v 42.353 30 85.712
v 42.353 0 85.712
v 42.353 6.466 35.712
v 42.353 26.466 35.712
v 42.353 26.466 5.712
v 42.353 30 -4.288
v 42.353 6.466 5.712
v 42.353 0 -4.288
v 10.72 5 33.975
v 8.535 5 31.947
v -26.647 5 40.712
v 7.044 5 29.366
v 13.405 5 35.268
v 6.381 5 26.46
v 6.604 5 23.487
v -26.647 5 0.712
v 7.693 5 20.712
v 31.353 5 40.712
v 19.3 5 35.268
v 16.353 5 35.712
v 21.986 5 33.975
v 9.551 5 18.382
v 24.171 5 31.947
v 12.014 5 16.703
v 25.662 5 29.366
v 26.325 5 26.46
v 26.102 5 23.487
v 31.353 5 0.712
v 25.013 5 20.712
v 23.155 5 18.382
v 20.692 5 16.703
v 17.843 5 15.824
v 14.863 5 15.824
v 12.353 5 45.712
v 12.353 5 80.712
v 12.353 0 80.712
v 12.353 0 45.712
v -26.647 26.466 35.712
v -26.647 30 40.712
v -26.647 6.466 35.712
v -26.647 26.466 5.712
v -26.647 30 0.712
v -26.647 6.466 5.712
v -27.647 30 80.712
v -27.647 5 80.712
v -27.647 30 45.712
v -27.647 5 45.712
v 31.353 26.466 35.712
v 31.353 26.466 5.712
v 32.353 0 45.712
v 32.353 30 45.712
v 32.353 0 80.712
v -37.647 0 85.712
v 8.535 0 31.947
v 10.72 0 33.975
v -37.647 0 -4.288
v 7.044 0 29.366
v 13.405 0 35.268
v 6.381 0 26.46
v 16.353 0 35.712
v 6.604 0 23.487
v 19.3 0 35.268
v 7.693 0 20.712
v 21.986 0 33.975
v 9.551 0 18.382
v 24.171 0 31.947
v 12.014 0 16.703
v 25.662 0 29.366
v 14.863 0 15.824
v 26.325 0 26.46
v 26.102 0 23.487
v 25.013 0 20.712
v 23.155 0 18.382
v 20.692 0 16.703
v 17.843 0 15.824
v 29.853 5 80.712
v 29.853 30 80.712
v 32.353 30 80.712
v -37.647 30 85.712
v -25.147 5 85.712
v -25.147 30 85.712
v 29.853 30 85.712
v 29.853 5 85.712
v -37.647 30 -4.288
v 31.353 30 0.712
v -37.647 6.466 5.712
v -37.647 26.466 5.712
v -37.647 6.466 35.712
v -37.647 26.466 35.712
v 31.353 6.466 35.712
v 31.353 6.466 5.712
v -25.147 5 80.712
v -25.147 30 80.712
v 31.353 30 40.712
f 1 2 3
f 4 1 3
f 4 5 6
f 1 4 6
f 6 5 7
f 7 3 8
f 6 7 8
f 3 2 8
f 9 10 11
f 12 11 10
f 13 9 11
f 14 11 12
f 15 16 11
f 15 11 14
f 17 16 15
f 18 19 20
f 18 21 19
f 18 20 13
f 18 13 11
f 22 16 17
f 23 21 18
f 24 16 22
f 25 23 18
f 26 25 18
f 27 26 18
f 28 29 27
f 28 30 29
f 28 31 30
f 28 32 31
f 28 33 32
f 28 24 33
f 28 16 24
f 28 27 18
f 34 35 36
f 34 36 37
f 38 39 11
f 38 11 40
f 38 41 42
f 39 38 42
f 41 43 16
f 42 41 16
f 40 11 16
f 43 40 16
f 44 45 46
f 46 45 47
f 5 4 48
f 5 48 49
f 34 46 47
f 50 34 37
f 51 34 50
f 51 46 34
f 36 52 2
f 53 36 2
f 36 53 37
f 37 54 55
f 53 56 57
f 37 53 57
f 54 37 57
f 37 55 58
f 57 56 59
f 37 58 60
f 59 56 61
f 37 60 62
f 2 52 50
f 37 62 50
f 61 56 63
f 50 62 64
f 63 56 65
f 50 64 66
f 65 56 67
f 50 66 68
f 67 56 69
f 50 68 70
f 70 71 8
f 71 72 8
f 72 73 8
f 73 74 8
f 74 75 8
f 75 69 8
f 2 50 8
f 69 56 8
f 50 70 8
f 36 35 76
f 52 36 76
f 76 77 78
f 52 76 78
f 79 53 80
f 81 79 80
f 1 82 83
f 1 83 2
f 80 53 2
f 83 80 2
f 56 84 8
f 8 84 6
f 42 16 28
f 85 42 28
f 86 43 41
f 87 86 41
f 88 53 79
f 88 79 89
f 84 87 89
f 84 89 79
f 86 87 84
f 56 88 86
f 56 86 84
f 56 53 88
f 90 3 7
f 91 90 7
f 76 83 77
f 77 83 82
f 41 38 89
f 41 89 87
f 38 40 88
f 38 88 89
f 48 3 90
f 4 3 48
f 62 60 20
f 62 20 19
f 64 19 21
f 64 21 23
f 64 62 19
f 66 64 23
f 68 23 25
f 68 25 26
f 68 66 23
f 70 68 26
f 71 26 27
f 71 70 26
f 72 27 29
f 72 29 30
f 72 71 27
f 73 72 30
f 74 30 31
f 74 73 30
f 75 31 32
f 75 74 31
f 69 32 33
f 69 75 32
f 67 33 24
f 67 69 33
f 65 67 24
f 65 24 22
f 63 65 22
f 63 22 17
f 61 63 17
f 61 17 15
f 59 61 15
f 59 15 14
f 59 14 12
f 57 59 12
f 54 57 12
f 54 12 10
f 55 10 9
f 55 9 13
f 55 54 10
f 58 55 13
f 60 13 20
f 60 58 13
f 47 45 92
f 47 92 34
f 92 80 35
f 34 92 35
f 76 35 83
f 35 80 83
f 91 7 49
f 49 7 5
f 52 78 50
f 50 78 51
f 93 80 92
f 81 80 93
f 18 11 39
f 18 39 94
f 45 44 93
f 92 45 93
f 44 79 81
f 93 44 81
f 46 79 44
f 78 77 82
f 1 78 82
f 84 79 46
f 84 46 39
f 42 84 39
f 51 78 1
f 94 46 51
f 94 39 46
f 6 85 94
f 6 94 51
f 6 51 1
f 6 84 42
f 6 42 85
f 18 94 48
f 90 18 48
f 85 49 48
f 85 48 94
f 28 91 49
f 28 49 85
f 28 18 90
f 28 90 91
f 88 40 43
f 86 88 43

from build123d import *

# Parameters (mm, degrees)
SKETCH2_W          = 80
SKETCH2_H          = 100
SKETCH2_R          = 10
CAMERA_LENSE_DEPTH = 5
SKETCH3_W          = 80
SKETCH3_H          = 100
SKETCH3_W_2        = 58
SKETCH3_H_2        = 40
SKETCH3_W_3        = 60
SKETCH3_H_3        = 35
CAMERA_DEPTH       = 25
HOLLOW_START       = -2
SKETCH4_W          = 78
SKETCH4_H          = 27.979664862
HOLLOW_TOP_DEPTH   = 8
SKETCH10_W         = 80
SKETCH10_H         = 10
CUT_EXTRUDE4_DEPTH = 101.201733938
SKETCH11_W         = 30
SKETCH11_H         = 20
CUT_EXTRUDE5_DEPTH = 122.023203799
SKETCH12_W         = 20
SKETCH12_H         = 35
CUT_EXTRUDE6_DEPTH = 99.819975127
SKETCH13_W         = 55
SKETCH13_H         = 25
CUT_EXTRUDE7_DEPTH = 10


with BuildPart() as part:
    # Sketch2 → camera lense (new body)
    with BuildSketch(Plane(origin=(0, 0, 0), x_dir=(1, 0, 0), z_dir=(0, 1, 0))):
        with Locations((2.352941176, -35.712402007)):
            Rectangle(SKETCH2_W, SKETCH2_H)
        with Locations(Location((16.352941176, -25.712402007, 0), (0, 0, 270))):
            Circle(SKETCH2_R, mode=Mode.SUBTRACT)
    extrude(amount=CAMERA_LENSE_DEPTH)

    # Sketch3 → camera (add)
    with BuildSketch(Plane(origin=(0, 5, 0), x_dir=(1, 0, 0), z_dir=(0, 1, 0))):
        with Locations((2.352941176, -35.712402007)):
            Rectangle(SKETCH3_W, SKETCH3_H)
        with Locations((2.352941176, -20.712402007)):
            Rectangle(SKETCH3_W_2, SKETCH3_H_2, mode=Mode.SUBTRACT)
        with Locations((2.352941176, -63.212402007)):
            Rectangle(SKETCH3_W_3, SKETCH3_H_3, mode=Mode.SUBTRACT)
    extrude(amount=CAMERA_DEPTH)

    # Sketch4 → hollow top (cut)
    with BuildSketch(Plane(origin=(0, 0, -14.287597993), x_dir=(-1, 0, 0), z_dir=(0, 0, -1)).offset(HOLLOW_START)):
        with Locations((-2.352941176, 14.989832431)):
            Rectangle(SKETCH4_W, SKETCH4_H)
    extrude(amount=-HOLLOW_TOP_DEPTH, mode=Mode.SUBTRACT)

    # Sketch10 → Cut-Extrude4 (cut, through all)
    with BuildSketch(Plane(origin=(0, 30, 0), x_dir=(1, 0, 0), z_dir=(0, 1, 0))):
        with Locations((2.352941176, 9.287597993)):
            Rectangle(SKETCH10_W, SKETCH10_H)
    extrude(amount=-CUT_EXTRUDE4_DEPTH, mode=Mode.SUBTRACT)

    # Sketch11 → Cut-Extrude5 (cut, through all)
    with BuildSketch(Plane(origin=(42.352941176, 0, 0), x_dir=(0, 0, -1), z_dir=(1, 0, 0))):
        with Locations((-20.712402007, 16.465766073)):
            Rectangle(SKETCH11_W, SKETCH11_H)
    extrude(amount=-CUT_EXTRUDE5_DEPTH, mode=Mode.SUBTRACT)

    # Sketch12 → Cut-Extrude6 (cut, through all)
    with BuildSketch(Plane(origin=(0, 5, 0), x_dir=(1, 0, 0), z_dir=(0, 1, 0))):
        with Locations((22.352941176, -63.212402007)):
            Rectangle(SKETCH12_W, SKETCH12_H)
    extrude(amount=-CUT_EXTRUDE6_DEPTH, mode=Mode.SUBTRACT)

    # Sketch13 → Cut-Extrude7 (cut)
    with BuildSketch(Plane.XY.offset(85.712402007)):
        with Locations((2.352941176, 17.5)):
            Rectangle(SKETCH13_W, SKETCH13_H)
    extrude(amount=-CUT_EXTRUDE7_DEPTH, mode=Mode.SUBTRACT)


solid = part.part
